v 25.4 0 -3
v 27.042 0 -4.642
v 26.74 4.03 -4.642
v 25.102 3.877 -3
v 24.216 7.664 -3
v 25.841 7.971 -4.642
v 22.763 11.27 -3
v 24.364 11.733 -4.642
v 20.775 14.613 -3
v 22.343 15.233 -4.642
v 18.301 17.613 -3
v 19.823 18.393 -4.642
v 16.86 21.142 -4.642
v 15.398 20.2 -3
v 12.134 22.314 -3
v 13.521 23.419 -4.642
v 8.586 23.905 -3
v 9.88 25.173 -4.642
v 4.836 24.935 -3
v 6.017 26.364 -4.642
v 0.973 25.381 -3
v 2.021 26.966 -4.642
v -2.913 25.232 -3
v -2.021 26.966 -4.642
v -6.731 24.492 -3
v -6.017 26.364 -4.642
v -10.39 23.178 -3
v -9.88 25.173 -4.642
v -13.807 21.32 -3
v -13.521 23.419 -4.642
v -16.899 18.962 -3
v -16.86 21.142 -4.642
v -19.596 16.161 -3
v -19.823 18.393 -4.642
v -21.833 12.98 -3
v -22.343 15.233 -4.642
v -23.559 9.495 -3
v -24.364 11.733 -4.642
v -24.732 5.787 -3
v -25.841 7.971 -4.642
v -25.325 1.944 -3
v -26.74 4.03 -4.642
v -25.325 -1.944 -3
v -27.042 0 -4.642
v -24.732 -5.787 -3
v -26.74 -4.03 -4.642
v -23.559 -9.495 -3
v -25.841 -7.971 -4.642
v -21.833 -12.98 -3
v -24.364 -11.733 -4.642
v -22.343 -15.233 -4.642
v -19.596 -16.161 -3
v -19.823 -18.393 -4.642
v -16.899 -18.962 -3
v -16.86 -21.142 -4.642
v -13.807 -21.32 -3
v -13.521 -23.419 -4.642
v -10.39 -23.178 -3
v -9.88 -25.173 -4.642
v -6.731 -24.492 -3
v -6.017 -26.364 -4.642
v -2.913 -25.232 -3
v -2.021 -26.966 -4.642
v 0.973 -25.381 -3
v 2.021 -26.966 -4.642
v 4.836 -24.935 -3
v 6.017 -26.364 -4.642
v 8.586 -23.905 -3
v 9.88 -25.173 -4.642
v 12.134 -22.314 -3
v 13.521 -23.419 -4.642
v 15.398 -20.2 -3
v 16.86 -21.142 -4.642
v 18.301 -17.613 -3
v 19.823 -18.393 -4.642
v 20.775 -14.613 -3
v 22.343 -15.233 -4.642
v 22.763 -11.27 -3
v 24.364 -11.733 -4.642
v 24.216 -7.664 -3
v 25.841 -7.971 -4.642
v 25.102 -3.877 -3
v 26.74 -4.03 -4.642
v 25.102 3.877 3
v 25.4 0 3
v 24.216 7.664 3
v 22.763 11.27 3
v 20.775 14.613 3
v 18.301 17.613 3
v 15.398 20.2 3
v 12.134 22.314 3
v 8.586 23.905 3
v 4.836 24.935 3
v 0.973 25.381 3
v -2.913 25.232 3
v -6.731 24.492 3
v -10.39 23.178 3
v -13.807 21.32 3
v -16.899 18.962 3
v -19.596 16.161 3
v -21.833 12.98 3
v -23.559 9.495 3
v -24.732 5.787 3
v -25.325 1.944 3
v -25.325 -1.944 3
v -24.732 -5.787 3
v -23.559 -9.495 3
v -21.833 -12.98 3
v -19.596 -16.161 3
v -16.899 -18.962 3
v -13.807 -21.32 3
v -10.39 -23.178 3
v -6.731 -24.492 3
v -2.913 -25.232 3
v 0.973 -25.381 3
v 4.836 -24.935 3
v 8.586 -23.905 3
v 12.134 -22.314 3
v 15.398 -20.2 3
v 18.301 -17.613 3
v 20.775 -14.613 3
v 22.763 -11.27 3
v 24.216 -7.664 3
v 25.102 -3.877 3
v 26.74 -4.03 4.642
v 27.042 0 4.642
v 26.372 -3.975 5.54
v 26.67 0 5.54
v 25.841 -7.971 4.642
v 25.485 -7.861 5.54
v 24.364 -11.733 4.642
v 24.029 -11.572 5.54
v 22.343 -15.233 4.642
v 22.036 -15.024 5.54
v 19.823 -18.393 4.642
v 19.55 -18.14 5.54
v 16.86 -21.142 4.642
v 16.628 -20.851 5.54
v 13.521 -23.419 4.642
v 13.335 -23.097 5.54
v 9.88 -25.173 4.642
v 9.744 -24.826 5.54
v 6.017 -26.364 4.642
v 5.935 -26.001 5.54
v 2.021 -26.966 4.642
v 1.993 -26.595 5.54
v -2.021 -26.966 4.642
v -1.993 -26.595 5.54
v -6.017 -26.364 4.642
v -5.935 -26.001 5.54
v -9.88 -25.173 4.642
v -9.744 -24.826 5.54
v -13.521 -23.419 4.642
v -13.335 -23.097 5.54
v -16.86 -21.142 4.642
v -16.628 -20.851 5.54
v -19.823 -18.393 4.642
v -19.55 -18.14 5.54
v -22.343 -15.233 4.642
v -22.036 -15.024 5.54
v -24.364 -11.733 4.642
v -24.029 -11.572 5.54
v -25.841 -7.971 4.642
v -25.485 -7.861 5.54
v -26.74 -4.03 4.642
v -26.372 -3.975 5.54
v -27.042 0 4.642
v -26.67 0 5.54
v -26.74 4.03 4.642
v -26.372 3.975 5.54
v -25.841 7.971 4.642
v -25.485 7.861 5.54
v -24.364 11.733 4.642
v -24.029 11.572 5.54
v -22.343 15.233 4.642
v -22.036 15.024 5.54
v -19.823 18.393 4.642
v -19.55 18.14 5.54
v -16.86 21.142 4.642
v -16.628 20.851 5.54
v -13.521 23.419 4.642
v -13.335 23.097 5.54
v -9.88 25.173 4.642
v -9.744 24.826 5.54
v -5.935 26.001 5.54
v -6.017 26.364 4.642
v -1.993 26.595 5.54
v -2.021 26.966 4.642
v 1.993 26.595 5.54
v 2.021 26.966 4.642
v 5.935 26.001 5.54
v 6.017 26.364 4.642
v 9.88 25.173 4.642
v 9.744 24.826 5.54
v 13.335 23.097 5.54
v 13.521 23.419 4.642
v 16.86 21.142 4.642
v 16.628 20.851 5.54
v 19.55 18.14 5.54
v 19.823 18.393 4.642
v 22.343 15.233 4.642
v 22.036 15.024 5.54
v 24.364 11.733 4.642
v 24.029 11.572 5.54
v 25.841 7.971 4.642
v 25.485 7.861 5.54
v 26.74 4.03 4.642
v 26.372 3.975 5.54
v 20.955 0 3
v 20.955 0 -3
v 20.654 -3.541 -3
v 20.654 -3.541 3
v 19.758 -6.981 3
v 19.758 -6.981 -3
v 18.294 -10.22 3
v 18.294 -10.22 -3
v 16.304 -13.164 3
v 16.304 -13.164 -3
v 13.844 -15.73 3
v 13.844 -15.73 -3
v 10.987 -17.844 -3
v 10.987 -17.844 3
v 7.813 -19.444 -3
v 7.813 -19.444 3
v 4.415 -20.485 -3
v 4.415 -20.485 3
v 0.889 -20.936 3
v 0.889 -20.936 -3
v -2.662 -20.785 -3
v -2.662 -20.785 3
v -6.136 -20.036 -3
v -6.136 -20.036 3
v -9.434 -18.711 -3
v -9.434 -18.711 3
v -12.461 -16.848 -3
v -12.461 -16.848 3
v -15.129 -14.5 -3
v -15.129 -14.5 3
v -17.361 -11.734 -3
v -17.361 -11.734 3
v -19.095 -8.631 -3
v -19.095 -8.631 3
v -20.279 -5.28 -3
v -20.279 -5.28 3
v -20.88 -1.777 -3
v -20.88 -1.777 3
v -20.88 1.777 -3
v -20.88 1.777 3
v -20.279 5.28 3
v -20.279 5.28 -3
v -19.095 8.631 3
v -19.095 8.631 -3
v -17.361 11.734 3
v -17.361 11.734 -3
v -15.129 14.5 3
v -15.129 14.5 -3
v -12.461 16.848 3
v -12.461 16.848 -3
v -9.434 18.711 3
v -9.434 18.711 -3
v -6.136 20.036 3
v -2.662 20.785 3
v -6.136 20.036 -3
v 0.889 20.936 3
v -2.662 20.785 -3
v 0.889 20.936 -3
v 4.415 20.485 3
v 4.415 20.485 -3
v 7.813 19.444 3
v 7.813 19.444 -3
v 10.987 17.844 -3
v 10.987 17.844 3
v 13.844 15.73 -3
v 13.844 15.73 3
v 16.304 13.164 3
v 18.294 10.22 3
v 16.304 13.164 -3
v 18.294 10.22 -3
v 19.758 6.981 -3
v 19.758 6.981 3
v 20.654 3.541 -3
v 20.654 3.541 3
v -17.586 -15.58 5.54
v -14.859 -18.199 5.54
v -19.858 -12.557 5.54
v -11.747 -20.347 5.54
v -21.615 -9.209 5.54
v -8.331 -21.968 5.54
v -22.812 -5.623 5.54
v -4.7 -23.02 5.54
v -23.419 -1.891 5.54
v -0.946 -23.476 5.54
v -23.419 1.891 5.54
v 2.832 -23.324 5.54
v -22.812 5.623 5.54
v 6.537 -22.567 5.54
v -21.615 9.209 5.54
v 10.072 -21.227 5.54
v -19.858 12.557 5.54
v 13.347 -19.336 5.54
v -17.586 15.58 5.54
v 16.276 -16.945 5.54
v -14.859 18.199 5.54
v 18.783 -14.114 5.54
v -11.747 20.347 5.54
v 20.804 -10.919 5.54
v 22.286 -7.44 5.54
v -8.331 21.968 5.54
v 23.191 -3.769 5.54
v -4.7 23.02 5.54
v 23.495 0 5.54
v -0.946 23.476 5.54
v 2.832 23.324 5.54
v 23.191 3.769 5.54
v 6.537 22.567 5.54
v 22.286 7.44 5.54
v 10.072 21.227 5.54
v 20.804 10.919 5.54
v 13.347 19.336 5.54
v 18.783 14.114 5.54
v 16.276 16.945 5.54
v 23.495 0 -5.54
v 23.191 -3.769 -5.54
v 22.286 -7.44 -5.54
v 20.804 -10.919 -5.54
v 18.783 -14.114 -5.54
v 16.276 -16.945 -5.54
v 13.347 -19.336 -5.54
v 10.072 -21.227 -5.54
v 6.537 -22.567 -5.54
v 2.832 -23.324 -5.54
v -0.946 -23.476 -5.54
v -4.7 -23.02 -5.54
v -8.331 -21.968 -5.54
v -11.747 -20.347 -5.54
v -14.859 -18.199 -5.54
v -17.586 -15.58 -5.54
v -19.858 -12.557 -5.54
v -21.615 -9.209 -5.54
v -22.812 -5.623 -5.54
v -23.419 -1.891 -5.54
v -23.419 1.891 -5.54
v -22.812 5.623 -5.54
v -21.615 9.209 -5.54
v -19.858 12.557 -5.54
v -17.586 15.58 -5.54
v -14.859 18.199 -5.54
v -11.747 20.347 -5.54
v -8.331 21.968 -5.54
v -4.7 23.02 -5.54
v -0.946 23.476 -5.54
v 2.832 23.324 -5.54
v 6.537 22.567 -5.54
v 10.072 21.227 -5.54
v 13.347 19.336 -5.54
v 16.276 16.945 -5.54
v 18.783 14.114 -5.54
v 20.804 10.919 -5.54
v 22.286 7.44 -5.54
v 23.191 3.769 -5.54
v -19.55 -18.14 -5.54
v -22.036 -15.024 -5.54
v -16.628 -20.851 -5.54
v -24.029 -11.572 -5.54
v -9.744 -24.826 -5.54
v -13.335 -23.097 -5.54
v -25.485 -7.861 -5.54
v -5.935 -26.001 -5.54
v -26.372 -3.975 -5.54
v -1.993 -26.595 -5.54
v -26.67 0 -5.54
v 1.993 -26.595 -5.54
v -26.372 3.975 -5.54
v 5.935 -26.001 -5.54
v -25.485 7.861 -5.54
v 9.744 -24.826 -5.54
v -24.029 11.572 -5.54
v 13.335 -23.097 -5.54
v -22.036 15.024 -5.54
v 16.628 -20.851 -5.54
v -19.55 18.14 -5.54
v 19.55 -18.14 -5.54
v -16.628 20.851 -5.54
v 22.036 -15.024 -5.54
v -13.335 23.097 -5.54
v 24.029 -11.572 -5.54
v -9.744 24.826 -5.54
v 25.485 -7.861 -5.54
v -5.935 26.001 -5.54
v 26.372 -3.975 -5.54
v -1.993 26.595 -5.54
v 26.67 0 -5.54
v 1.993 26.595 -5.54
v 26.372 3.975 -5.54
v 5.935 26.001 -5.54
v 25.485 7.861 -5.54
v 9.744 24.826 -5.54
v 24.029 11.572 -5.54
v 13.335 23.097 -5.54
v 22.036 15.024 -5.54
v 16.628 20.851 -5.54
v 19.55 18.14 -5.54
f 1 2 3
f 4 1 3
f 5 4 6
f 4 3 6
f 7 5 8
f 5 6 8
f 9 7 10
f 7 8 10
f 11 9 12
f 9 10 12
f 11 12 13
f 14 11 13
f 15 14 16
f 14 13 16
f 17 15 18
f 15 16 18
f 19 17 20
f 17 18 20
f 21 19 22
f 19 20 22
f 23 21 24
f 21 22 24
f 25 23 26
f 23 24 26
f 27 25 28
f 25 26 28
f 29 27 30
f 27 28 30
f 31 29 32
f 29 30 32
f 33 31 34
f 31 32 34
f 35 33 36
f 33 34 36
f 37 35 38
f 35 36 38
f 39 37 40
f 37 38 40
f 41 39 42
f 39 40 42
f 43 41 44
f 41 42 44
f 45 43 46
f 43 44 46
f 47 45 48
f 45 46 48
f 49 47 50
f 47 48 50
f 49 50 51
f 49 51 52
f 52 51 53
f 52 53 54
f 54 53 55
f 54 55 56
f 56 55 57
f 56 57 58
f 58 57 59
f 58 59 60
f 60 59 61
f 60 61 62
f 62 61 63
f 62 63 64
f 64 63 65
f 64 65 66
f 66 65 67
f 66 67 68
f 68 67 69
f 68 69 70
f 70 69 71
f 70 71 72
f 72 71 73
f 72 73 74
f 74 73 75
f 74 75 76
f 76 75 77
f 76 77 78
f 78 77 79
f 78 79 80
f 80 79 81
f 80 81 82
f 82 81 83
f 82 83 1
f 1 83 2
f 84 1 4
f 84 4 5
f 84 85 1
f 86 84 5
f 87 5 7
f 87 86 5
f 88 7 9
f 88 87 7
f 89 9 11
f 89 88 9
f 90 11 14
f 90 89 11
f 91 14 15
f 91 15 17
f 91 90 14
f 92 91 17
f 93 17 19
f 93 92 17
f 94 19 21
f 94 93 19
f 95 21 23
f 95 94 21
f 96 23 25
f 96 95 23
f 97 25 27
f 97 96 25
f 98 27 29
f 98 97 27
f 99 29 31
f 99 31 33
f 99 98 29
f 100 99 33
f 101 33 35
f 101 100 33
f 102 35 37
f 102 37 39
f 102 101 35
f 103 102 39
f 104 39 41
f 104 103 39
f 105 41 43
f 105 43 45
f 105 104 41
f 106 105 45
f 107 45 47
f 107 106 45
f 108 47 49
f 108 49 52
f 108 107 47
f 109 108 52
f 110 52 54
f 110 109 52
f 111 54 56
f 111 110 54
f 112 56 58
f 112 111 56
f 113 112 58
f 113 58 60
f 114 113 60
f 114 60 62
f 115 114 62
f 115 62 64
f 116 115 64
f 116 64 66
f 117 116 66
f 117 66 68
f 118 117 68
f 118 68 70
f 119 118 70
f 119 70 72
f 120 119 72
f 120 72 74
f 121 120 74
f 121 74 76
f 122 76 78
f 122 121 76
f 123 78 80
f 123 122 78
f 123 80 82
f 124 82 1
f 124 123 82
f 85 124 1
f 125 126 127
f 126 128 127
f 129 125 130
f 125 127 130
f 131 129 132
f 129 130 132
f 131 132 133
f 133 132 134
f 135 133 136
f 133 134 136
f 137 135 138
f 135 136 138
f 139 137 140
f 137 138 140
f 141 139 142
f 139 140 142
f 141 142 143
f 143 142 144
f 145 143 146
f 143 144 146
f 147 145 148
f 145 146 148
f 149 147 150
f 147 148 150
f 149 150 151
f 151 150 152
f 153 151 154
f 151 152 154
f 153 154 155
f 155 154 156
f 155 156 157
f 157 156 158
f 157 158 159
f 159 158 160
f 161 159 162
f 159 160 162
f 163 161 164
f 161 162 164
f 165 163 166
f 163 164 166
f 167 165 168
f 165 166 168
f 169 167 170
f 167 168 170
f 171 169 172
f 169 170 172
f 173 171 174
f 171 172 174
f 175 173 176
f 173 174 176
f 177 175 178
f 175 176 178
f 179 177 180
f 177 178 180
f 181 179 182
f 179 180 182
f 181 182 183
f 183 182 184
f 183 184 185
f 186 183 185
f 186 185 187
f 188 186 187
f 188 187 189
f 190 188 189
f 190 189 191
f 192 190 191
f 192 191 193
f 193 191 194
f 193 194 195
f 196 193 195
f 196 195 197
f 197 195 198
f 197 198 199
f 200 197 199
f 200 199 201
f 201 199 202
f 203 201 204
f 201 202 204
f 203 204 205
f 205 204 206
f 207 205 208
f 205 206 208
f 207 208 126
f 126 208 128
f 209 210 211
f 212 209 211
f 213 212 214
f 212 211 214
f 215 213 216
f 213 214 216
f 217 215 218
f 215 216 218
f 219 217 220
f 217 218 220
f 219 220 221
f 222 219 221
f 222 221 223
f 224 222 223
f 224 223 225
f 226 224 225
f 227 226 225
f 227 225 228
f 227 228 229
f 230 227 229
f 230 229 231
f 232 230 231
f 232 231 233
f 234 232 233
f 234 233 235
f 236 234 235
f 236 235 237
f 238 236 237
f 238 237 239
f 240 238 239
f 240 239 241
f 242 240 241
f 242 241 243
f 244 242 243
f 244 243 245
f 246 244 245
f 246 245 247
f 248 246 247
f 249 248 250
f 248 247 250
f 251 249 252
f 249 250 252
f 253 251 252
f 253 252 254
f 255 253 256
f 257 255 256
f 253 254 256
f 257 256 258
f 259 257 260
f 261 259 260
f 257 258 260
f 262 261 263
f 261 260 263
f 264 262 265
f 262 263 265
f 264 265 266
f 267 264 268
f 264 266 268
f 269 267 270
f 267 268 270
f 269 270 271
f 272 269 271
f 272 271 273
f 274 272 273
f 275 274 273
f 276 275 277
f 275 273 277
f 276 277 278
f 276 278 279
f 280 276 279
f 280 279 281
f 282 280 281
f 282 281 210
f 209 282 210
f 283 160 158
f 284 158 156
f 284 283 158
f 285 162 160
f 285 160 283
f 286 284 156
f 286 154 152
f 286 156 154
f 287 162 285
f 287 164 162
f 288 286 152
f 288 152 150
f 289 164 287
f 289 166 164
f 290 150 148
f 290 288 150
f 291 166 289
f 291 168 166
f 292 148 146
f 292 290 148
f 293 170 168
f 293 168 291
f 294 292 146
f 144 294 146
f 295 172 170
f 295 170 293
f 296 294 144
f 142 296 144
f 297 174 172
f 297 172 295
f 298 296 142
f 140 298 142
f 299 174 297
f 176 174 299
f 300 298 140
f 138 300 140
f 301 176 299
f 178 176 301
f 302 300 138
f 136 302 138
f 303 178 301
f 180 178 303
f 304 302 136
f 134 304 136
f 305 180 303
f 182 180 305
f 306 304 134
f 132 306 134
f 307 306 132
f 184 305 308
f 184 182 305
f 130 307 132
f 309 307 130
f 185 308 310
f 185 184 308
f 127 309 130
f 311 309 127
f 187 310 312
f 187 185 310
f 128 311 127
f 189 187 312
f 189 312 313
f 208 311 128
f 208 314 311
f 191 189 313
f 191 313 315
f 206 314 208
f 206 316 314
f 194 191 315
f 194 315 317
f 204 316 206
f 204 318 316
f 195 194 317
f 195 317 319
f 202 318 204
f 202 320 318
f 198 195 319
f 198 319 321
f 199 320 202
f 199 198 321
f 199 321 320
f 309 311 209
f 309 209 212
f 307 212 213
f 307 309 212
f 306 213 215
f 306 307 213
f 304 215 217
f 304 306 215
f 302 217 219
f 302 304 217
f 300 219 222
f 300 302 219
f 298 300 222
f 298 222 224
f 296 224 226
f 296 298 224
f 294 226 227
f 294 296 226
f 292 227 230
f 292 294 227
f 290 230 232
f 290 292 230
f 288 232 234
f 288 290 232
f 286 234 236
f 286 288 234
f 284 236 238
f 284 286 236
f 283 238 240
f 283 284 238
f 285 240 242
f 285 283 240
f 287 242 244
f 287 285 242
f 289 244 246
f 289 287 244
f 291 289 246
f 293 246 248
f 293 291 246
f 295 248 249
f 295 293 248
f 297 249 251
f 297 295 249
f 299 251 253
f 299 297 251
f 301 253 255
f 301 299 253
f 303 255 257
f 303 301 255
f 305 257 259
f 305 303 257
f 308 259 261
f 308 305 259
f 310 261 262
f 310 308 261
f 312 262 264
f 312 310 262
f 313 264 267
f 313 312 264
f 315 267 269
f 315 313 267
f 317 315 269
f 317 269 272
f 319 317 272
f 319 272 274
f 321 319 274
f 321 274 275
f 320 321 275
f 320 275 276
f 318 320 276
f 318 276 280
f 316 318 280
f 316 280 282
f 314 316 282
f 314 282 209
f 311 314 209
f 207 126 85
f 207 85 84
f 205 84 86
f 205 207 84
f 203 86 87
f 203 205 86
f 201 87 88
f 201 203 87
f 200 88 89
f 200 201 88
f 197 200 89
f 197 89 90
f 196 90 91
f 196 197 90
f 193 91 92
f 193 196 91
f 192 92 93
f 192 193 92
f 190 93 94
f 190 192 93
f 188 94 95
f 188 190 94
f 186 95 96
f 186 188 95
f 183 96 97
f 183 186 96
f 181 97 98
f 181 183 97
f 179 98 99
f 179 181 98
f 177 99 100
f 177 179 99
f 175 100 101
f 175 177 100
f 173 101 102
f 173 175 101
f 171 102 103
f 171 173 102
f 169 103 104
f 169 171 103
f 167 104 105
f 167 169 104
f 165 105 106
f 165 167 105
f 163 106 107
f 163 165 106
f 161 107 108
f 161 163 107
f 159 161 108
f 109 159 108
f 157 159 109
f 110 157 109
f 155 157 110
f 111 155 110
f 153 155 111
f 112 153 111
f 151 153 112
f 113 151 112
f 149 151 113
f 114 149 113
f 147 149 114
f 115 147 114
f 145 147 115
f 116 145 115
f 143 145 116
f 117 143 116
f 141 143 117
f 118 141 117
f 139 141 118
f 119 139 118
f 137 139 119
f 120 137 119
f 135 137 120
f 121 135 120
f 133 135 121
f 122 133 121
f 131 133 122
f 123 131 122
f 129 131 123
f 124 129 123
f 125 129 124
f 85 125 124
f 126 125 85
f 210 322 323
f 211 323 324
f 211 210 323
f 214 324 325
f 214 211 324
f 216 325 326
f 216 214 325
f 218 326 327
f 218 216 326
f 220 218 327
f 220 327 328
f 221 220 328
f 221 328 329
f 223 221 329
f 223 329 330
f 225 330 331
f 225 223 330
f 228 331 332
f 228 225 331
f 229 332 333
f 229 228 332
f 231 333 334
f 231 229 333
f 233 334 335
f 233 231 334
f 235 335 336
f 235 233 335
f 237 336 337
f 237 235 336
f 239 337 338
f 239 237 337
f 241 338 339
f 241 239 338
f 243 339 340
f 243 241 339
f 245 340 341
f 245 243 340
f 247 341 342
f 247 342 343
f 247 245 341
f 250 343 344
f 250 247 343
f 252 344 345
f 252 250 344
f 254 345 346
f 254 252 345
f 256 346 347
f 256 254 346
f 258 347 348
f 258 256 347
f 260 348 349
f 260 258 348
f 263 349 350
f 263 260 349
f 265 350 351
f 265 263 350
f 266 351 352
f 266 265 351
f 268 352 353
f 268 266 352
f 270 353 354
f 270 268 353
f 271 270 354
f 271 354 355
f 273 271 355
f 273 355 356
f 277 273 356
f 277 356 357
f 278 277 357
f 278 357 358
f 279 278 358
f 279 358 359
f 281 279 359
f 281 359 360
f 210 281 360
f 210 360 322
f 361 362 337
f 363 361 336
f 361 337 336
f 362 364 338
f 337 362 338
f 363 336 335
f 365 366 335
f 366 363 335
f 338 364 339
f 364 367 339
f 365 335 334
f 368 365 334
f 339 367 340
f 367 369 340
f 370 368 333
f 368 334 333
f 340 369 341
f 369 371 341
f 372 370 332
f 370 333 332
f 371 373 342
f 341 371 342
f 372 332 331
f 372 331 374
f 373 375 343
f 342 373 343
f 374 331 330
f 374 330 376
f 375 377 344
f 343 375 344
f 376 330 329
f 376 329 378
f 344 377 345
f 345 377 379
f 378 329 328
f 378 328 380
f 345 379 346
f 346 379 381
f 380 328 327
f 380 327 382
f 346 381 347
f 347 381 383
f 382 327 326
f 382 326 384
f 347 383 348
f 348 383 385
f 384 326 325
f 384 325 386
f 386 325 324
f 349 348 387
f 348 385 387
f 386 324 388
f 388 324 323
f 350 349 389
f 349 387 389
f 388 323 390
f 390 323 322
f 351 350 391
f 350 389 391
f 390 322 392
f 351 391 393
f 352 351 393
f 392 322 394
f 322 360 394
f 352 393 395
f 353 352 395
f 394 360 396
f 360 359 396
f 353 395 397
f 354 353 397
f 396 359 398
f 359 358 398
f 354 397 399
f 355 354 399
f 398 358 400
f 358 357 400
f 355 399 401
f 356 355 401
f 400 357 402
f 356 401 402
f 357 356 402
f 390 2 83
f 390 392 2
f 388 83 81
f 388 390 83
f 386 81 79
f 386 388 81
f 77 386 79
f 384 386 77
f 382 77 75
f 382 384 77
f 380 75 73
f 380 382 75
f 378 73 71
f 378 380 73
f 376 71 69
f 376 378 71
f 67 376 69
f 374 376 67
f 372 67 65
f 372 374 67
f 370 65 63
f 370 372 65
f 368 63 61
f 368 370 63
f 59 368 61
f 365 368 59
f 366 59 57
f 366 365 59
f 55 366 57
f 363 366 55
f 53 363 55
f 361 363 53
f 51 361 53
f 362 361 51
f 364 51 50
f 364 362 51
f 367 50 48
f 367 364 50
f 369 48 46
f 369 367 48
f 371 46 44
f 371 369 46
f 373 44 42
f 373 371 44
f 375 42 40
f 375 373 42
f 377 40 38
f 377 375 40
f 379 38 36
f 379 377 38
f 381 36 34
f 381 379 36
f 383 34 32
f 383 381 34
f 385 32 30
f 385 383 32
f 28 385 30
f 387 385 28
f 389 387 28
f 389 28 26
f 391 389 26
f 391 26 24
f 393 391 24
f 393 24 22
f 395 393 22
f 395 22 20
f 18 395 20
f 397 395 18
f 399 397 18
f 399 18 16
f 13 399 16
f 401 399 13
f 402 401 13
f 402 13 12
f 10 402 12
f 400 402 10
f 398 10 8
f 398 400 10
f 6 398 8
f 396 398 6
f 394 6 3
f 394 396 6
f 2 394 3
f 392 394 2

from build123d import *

# Parameters (mm, degrees)
F0_R      = 25.4
F1_DEPTH  = 3
F1_FACE_R = 25.4
F2_DEPTH  = 2.54
F2_TAPER  = -45
F5_R      = 20.955
F6_DEPTH  = 11.081
F7_SIZE   = 2.54


# Not quite as in the source:
# - a fillet or chamfer that OpenCascade refuses, or shapes differently, is made with other operations: its cross-section is extruded or revolved along the edge and cut away or added


with BuildPart() as f1:
    # F0 (on Top) → F1 (new body)
    with BuildSketch(Plane.XY):
        Circle(F0_R)
    extrude(amount=F1_DEPTH)

    # F1_face (on face) → F2 (join)
    with BuildSketch(Plane.XY.offset(3)):
        Circle(F1_FACE_R)
    extrude(amount=F2_DEPTH, taper=F2_TAPER)

    # F3: F1 across plane


with BuildPart() as f1_1:
    add(f1.part)
    add(f1.part.mirror(Plane.XY))

    # F4: chamfer of 1.27 on 2 edges, made by hand

    # F4_s1 → F4_t2 (revolve, cut)
    with BuildSketch(Plane.XZ):
        Polygon((27.0419743879, 4.6419743879), (26.67, 5.54), (27.94, 5.54), align=None)
    revolve(axis=Axis((0, 0, 5.54), (0, 0, -1)), mode=Mode.SUBTRACT)

    # F4_s3 → F4_t4 (revolve, cut)
    with BuildSketch(Plane.XZ):
        Polygon((27.0419743879, -4.6419743879), (26.67, -5.54), (27.94, -5.54), align=None)
    revolve(axis=Axis((0, 0, -5.54), (0, 0, -1)), mode=Mode.SUBTRACT)

    # F5 (on face) → F6 (cut, through all)
    with BuildSketch(Plane(origin=(0, 0, -5.54), x_dir=(1, 0, 0), z_dir=(0, 0, -1))):
        Circle(F5_R)
    extrude(amount=-F6_DEPTH, mode=Mode.SUBTRACT)

    # F7
    f7_edges = [f1_1.edges().sort_by_distance(p)[0] for p in [
        (-20.955, 0, 5.54),
        (-20.955, 0, -5.54),
    ]]
    chamfer(f7_edges, length=F7_SIZE)


solid = f1_1.part
